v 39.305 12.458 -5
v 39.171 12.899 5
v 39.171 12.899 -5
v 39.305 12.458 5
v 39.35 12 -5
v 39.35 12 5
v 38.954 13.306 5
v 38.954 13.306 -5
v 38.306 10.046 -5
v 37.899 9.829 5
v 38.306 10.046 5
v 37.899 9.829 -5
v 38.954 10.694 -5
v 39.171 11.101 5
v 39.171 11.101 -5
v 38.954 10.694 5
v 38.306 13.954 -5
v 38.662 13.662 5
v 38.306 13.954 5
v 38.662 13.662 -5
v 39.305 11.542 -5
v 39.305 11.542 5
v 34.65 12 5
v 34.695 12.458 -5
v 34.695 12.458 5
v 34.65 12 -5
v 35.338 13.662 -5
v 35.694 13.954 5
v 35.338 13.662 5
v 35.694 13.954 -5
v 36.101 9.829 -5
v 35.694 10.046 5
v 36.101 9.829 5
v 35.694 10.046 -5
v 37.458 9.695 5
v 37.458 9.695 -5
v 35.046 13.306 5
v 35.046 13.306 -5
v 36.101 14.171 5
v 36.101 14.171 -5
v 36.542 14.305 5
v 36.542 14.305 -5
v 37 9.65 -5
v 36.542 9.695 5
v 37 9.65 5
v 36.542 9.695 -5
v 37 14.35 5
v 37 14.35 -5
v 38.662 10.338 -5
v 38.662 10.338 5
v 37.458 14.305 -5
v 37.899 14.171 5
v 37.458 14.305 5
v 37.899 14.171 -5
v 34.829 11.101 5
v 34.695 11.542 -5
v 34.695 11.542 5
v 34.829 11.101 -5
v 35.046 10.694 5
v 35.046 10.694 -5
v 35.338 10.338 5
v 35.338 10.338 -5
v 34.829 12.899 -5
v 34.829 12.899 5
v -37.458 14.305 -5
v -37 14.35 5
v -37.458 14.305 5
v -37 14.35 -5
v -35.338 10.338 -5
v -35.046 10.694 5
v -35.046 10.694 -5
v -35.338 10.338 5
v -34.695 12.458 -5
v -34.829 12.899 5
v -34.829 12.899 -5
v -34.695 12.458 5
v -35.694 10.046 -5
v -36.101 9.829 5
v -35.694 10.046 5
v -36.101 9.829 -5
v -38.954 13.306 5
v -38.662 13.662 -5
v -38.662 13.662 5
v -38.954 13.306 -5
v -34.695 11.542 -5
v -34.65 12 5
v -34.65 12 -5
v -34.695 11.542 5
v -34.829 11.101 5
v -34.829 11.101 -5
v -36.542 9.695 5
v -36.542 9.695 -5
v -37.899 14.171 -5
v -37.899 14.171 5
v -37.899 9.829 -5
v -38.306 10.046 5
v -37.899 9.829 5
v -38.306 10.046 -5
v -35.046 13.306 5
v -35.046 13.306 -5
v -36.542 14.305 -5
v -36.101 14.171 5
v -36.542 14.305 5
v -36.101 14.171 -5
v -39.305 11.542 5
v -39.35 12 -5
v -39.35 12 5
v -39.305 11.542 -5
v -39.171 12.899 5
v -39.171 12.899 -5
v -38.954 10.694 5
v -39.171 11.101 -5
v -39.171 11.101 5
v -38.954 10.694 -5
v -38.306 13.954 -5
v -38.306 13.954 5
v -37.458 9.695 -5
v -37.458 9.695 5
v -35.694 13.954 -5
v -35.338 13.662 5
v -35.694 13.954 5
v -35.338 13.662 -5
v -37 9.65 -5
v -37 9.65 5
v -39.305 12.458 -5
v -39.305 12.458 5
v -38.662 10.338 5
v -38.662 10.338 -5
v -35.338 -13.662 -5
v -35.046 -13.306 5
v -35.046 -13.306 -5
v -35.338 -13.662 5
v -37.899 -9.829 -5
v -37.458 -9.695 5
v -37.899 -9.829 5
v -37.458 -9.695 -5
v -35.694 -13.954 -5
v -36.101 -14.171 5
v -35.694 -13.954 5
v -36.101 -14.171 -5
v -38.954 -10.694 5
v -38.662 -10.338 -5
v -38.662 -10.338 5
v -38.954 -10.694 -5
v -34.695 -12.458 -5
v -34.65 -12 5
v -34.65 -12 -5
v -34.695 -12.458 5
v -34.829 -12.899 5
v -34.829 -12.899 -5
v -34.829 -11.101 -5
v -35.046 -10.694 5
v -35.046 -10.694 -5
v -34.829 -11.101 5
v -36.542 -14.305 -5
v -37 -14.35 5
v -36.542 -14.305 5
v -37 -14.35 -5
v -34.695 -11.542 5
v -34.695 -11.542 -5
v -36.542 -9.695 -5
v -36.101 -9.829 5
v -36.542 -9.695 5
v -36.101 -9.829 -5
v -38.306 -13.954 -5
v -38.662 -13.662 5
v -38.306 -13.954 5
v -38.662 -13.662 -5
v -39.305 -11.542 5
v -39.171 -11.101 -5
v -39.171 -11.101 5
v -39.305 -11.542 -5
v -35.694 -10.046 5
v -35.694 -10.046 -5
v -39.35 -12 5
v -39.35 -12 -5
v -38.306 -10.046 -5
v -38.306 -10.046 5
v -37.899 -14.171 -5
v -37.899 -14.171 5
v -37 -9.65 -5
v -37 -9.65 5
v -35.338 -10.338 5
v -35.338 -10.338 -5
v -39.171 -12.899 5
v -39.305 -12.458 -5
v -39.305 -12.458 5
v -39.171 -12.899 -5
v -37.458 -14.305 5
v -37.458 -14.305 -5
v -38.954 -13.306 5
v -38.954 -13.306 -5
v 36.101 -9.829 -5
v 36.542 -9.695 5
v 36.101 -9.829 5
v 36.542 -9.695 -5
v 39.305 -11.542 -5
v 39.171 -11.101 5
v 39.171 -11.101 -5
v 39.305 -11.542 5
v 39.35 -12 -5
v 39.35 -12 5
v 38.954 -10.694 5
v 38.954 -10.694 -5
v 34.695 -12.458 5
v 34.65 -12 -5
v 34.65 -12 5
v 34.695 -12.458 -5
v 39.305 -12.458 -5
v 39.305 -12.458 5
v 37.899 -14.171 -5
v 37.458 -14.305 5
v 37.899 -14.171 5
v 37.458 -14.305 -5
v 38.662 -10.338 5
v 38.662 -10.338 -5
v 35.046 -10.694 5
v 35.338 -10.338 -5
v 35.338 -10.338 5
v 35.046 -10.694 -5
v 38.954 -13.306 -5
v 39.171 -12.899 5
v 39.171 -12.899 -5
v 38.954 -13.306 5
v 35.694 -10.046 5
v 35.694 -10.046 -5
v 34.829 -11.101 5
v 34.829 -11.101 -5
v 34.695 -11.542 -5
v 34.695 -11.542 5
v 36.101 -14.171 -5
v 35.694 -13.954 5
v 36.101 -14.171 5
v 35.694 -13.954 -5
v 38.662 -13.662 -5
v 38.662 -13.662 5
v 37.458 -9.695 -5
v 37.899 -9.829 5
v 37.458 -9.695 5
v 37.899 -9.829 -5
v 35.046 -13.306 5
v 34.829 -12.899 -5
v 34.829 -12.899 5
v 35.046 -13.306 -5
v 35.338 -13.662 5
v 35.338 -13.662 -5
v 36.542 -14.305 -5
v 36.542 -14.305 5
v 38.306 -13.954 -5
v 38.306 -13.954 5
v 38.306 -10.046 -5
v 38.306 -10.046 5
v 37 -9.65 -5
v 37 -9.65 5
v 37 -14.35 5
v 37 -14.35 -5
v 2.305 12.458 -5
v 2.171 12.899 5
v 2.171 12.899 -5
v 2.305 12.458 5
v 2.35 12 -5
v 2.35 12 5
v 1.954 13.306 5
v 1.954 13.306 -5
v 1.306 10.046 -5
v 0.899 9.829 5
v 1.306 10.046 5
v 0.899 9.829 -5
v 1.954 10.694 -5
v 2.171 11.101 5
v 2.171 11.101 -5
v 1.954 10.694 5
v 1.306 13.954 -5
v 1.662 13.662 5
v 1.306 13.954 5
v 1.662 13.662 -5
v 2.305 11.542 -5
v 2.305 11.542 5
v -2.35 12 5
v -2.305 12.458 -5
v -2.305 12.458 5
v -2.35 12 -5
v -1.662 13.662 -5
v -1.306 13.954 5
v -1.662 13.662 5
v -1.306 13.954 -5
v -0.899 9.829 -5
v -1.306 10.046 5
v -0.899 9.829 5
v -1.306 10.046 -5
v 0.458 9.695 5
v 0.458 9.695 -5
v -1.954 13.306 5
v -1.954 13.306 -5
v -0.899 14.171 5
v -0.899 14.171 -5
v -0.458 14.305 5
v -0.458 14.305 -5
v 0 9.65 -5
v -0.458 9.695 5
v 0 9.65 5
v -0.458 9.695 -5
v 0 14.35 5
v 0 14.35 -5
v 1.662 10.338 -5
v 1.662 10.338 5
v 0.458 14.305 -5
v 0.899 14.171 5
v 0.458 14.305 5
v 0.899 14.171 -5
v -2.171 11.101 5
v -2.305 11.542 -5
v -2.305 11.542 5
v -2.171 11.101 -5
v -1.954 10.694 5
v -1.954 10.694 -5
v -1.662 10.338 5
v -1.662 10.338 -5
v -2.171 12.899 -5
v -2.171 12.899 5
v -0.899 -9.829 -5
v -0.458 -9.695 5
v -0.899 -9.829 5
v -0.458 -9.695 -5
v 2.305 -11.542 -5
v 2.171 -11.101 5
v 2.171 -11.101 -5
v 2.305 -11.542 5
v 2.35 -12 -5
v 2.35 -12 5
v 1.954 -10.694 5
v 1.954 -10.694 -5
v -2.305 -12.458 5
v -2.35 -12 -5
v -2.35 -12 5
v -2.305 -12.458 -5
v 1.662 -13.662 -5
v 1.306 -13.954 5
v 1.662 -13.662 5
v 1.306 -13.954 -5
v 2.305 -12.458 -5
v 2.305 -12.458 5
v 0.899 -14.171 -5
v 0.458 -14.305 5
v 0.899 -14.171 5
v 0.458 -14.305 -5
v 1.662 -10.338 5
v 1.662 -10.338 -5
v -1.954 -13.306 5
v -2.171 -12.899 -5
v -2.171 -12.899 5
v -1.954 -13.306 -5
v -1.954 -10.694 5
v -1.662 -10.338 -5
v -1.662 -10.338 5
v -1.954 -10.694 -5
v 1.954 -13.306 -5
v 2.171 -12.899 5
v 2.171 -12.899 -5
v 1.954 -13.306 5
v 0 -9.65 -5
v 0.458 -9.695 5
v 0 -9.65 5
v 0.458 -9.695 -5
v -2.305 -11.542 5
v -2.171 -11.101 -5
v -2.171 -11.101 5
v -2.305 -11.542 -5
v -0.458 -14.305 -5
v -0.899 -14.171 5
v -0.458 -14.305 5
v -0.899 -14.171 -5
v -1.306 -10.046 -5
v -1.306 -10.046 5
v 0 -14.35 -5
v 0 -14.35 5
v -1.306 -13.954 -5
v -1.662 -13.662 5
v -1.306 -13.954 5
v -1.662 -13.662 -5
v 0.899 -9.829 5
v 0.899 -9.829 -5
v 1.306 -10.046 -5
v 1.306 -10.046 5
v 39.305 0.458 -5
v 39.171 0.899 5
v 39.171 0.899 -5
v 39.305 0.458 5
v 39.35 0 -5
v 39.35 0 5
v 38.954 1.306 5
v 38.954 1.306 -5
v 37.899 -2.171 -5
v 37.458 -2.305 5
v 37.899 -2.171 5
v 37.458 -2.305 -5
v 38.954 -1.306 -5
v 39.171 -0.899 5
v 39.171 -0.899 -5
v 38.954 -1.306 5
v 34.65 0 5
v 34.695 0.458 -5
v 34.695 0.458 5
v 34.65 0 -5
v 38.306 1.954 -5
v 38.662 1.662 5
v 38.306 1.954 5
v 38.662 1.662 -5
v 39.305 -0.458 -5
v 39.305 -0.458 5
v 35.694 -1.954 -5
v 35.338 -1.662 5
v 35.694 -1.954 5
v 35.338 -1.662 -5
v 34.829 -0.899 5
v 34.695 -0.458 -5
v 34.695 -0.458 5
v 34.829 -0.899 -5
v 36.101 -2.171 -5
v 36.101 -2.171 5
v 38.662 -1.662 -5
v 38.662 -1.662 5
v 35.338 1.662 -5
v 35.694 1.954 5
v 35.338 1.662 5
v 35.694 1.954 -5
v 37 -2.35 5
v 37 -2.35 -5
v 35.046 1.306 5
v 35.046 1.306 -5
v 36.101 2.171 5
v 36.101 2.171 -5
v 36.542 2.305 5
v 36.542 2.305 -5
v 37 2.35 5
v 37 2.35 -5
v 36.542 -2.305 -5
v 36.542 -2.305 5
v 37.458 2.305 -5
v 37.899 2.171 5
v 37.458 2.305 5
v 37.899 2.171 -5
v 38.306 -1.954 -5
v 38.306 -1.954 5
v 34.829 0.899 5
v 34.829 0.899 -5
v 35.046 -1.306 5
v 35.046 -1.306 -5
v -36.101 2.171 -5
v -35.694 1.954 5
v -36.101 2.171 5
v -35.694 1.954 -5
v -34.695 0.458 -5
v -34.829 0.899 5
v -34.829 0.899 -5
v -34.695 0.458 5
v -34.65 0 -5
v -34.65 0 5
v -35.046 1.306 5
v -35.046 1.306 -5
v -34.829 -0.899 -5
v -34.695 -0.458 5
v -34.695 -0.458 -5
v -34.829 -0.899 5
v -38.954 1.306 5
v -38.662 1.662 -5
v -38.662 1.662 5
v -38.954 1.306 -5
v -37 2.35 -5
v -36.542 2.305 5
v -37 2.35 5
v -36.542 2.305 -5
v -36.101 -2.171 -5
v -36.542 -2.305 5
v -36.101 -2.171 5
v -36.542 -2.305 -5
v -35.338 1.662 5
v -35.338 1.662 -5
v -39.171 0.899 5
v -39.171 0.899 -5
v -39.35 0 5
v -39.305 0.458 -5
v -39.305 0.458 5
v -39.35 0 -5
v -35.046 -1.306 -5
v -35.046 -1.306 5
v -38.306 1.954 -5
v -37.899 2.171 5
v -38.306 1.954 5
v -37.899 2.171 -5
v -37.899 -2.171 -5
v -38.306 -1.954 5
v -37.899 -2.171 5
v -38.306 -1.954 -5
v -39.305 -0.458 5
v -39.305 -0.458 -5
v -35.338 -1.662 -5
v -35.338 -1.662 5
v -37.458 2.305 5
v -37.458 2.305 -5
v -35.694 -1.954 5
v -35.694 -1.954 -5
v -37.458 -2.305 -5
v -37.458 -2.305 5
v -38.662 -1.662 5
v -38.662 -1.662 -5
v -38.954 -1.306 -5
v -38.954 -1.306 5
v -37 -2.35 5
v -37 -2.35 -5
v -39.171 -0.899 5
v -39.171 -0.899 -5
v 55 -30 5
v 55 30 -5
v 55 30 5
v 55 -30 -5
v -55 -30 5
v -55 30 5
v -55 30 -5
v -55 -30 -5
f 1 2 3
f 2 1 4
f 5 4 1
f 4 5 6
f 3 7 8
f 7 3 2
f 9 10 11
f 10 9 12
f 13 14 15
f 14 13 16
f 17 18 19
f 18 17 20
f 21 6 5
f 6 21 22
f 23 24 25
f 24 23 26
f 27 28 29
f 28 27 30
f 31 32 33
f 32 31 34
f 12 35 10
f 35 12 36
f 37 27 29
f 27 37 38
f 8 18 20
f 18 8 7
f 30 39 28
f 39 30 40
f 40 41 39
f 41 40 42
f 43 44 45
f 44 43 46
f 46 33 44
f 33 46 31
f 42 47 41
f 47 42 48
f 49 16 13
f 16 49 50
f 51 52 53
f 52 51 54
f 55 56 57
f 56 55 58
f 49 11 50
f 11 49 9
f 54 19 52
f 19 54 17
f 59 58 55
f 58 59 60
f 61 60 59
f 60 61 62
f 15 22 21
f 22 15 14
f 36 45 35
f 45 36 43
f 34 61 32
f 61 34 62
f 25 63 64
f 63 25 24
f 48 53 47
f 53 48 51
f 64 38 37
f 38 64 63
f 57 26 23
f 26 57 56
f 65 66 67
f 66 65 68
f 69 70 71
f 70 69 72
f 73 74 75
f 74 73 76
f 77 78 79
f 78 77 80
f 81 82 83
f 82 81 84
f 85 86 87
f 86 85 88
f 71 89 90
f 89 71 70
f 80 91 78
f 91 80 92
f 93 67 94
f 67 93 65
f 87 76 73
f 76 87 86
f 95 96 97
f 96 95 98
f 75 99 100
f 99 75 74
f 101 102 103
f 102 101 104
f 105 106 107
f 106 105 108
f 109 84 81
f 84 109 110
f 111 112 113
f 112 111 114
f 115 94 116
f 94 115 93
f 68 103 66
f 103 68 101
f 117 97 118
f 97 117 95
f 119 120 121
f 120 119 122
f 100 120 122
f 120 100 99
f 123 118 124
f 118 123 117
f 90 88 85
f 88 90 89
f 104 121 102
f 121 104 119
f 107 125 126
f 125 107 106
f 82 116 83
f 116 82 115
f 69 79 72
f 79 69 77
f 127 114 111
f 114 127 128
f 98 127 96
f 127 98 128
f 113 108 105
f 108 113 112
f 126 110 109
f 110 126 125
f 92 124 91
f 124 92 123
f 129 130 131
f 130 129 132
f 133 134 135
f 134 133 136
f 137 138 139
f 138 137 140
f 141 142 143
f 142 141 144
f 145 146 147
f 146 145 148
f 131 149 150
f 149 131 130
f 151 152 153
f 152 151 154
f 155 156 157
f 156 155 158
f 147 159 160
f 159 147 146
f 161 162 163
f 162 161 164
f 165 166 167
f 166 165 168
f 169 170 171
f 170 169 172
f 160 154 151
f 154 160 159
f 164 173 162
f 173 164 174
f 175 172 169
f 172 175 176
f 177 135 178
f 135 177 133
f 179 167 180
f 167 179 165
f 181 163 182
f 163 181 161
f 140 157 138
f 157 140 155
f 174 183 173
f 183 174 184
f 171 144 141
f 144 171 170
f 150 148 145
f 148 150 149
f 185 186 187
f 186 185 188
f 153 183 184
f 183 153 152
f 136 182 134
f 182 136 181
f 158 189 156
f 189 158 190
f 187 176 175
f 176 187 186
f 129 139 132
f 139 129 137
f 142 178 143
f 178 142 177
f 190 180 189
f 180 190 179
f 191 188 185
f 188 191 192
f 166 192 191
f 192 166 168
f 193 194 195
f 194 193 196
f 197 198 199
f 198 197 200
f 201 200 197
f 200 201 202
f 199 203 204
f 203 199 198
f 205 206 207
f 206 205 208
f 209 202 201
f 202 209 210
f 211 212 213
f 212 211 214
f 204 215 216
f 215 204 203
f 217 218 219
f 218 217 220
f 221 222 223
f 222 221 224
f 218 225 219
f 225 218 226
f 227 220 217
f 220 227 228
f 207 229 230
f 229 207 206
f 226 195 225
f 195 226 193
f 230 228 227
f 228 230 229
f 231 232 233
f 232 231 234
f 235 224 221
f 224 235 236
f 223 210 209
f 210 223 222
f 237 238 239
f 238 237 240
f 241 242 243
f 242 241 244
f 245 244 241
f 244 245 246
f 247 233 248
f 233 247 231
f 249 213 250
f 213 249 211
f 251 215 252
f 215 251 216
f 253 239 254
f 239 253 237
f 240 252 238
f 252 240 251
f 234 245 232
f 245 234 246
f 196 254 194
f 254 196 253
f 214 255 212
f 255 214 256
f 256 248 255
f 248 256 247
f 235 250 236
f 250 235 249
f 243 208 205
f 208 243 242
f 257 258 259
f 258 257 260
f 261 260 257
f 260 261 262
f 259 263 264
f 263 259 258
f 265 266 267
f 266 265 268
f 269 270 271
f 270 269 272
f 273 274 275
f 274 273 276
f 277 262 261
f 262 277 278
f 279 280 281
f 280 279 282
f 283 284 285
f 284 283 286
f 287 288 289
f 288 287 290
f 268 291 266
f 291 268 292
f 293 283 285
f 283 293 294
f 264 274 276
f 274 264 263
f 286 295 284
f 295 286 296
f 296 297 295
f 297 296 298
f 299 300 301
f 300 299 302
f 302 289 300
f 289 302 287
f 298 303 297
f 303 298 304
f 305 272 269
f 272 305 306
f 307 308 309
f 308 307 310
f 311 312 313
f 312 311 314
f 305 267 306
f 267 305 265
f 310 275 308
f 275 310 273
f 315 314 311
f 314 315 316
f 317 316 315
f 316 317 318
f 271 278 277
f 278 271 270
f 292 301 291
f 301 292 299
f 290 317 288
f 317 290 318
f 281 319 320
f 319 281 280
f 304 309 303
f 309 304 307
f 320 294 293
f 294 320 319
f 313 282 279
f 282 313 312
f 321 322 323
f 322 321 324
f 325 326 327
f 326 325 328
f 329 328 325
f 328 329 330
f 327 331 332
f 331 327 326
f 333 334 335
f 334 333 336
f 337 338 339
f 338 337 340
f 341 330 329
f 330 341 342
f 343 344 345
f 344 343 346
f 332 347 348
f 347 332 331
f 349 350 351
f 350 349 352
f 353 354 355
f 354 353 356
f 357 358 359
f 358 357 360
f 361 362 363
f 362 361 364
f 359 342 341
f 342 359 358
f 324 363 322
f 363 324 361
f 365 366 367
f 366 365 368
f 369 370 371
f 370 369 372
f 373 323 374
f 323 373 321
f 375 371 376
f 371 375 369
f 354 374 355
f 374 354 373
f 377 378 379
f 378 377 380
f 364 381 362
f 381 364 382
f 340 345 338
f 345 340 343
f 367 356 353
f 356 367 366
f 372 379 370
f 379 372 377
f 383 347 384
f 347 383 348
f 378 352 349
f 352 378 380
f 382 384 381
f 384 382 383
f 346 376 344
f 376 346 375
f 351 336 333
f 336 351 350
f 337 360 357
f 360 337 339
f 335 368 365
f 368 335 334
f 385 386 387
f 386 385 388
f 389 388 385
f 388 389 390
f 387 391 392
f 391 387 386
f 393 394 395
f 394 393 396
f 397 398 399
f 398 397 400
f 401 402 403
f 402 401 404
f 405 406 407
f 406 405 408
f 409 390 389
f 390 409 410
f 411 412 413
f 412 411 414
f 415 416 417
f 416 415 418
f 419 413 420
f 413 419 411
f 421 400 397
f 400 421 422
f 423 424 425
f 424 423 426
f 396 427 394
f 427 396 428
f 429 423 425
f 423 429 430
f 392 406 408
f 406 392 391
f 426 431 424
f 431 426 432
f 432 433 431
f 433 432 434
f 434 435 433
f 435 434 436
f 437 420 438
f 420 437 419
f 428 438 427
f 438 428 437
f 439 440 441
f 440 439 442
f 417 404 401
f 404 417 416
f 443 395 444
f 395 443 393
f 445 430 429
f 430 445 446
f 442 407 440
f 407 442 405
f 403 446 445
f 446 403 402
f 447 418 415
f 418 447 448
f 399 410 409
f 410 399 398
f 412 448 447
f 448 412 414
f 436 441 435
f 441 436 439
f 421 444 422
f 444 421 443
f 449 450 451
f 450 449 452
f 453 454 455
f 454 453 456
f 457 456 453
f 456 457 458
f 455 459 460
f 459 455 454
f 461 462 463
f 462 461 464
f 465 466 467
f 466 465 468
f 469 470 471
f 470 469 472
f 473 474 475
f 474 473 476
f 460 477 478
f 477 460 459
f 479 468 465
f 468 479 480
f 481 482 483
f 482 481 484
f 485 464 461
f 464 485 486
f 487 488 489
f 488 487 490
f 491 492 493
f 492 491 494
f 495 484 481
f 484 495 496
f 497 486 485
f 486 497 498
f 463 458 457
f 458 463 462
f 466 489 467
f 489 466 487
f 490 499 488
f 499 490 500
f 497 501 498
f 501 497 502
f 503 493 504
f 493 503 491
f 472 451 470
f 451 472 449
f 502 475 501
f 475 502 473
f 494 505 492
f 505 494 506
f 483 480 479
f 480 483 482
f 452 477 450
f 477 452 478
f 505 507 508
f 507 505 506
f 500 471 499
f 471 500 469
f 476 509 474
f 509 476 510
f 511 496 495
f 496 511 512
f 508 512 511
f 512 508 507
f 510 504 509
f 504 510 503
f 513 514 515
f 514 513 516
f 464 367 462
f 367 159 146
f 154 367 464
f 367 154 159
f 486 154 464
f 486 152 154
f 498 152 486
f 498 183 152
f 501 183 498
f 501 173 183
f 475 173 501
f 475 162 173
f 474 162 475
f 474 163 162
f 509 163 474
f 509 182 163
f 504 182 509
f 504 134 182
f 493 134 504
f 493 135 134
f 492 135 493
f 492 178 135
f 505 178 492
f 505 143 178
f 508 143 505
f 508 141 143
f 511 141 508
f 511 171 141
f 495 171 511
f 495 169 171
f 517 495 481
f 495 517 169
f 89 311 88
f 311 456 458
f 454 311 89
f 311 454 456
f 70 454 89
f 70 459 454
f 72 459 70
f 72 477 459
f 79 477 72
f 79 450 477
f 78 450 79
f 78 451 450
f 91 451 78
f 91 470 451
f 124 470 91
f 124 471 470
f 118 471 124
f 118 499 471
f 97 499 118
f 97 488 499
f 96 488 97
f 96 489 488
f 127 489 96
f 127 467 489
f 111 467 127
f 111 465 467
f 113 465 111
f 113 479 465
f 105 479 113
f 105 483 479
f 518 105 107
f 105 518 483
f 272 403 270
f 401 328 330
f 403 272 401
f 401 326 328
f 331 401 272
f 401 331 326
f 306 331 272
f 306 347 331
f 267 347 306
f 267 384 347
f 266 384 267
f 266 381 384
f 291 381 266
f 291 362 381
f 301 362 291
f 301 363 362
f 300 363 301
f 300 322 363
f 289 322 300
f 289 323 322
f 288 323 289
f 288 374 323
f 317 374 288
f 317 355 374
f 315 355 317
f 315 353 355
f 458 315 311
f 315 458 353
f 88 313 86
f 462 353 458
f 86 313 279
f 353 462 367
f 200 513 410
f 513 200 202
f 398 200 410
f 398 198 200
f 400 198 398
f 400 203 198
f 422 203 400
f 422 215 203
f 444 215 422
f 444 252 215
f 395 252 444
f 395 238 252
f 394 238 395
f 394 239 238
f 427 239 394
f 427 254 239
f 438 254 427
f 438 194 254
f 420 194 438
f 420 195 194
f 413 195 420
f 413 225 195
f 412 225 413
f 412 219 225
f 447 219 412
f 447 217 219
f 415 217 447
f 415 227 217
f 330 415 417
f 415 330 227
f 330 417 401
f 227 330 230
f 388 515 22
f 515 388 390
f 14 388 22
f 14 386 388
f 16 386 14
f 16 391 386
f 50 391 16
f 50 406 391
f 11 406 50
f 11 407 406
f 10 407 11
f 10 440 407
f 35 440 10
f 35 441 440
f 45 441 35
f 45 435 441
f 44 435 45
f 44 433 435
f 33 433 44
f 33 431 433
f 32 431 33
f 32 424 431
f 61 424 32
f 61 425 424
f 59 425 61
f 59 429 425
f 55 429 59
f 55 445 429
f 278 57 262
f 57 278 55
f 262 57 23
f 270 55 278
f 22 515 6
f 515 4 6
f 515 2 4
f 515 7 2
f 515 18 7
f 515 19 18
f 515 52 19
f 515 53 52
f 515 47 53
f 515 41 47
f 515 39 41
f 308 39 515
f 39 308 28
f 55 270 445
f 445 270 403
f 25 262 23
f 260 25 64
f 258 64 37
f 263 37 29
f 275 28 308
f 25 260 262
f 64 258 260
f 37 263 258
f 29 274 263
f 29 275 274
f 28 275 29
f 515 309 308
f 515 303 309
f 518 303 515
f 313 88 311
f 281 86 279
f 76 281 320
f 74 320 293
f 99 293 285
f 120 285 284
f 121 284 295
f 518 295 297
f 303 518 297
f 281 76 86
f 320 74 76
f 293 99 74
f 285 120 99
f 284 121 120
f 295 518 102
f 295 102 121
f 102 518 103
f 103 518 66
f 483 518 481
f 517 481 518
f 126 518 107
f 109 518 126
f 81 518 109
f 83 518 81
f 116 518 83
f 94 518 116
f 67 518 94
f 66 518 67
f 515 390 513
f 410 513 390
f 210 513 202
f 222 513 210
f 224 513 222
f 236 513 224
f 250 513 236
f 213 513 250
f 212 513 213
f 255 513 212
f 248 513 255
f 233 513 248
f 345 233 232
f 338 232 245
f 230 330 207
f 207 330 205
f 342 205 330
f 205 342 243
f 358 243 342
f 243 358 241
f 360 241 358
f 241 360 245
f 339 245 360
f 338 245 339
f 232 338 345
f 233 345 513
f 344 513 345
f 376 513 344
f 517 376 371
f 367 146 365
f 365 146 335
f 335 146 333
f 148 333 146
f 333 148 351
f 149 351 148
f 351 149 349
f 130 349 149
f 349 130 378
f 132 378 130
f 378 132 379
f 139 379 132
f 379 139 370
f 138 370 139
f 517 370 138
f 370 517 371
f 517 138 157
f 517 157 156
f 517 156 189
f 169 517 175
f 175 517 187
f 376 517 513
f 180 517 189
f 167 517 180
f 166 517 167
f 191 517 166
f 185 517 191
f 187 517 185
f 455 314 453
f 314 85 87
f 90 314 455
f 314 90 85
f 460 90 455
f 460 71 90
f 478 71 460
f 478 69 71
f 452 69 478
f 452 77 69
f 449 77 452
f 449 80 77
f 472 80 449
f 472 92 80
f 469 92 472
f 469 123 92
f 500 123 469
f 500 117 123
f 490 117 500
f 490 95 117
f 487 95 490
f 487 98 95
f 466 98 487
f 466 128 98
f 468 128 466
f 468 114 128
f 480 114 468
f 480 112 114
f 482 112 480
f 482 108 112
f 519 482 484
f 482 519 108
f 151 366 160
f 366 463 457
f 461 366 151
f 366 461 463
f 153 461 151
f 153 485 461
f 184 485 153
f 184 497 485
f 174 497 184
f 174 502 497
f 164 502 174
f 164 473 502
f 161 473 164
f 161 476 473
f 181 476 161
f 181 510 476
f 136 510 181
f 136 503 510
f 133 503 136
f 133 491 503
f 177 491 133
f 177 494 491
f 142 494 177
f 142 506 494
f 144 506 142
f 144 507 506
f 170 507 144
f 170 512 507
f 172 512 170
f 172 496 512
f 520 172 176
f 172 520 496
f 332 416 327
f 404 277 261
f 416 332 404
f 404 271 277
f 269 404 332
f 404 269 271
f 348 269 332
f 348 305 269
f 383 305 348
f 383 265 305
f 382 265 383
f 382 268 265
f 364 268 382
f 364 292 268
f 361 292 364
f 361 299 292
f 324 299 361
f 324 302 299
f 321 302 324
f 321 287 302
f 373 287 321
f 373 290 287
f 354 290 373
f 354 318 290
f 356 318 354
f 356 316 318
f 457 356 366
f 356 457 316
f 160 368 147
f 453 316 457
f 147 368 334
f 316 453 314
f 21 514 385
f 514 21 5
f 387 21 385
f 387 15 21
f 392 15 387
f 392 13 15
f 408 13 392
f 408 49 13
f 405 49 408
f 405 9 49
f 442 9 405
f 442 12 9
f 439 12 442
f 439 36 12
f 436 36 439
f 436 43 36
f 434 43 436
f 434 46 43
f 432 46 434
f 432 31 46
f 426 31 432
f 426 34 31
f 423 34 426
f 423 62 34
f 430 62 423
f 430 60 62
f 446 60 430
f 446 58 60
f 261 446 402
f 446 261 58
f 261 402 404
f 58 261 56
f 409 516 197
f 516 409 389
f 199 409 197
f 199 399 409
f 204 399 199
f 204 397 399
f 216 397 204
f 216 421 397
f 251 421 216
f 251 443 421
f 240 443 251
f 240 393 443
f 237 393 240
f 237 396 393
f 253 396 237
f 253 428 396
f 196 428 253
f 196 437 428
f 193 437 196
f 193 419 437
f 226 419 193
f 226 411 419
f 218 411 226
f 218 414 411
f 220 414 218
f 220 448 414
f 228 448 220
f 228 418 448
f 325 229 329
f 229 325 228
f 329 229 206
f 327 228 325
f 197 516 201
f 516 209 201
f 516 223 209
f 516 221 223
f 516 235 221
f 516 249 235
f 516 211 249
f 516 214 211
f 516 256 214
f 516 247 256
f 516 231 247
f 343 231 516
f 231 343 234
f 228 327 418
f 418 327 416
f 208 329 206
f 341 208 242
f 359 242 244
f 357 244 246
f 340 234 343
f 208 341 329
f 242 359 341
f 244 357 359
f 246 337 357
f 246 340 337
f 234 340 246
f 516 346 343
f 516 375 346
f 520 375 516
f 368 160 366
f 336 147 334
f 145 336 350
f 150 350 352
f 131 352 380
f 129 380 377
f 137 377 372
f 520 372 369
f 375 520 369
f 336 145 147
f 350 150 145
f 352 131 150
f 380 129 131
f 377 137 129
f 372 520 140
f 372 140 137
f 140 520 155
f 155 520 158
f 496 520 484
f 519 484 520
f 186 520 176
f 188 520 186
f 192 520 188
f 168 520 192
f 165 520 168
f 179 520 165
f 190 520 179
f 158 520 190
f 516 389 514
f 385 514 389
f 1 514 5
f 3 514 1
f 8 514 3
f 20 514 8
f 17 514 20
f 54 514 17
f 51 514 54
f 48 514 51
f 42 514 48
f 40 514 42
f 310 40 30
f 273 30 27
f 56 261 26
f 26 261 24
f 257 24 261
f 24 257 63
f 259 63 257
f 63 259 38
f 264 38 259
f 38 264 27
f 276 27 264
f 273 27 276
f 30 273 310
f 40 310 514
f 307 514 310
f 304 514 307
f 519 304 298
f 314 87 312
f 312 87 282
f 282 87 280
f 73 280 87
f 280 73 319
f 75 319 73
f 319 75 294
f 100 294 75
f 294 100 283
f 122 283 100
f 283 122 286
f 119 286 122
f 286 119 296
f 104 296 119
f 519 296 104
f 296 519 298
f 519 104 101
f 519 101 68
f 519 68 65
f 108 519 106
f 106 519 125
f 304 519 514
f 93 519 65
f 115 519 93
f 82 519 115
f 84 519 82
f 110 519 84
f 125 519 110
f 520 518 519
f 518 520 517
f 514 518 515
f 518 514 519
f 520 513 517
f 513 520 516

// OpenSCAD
$fn = 32;

// ----------------------------------------------------------------------
// Corner plate 110 x 60 x 10
// 8 holes, centres taken from the edge offset
// ----------------------------------------------------------------------

// --- parameters (mm) ---
plate = [110, 60, 10];  // overall size (x, y, z)
holes = 8;              // number of holes the drawing asks for
bore_d = 4.5;           // nominal hole diameter from the drawing
print_allowance = 0.2;  // clearance added for printing
edge = 18;              // hole centre offset from the plate edge

// --- derived feature positions (mm) ---
hole_d = bore_d + print_allowance;  // = 4.7   hole diameter as printed
corner_x = plate[0] / 2 - edge;     // = 37   corner hole X
corner_y = plate[1] / 2 - edge;     // = 12   corner hole Y
feature_centers = [
  [corner_x, corner_y],
  [-corner_x, corner_y],
  [-corner_x, -corner_y],
  [corner_x, -corner_y],
  [0, corner_y],
  [0, -corner_y],
  [corner_x, 0],
  [-corner_x, 0]
];   // hole centres the loop below drills

// plate outline, every hole drilled through with the same cutters
difference() {
  cube(plate, center = true);
  for (centre = feature_centers)
    translate([centre[0], centre[1], 0])
      cylinder(d = hole_d, h = plate[2] + 2, center = true);
}
